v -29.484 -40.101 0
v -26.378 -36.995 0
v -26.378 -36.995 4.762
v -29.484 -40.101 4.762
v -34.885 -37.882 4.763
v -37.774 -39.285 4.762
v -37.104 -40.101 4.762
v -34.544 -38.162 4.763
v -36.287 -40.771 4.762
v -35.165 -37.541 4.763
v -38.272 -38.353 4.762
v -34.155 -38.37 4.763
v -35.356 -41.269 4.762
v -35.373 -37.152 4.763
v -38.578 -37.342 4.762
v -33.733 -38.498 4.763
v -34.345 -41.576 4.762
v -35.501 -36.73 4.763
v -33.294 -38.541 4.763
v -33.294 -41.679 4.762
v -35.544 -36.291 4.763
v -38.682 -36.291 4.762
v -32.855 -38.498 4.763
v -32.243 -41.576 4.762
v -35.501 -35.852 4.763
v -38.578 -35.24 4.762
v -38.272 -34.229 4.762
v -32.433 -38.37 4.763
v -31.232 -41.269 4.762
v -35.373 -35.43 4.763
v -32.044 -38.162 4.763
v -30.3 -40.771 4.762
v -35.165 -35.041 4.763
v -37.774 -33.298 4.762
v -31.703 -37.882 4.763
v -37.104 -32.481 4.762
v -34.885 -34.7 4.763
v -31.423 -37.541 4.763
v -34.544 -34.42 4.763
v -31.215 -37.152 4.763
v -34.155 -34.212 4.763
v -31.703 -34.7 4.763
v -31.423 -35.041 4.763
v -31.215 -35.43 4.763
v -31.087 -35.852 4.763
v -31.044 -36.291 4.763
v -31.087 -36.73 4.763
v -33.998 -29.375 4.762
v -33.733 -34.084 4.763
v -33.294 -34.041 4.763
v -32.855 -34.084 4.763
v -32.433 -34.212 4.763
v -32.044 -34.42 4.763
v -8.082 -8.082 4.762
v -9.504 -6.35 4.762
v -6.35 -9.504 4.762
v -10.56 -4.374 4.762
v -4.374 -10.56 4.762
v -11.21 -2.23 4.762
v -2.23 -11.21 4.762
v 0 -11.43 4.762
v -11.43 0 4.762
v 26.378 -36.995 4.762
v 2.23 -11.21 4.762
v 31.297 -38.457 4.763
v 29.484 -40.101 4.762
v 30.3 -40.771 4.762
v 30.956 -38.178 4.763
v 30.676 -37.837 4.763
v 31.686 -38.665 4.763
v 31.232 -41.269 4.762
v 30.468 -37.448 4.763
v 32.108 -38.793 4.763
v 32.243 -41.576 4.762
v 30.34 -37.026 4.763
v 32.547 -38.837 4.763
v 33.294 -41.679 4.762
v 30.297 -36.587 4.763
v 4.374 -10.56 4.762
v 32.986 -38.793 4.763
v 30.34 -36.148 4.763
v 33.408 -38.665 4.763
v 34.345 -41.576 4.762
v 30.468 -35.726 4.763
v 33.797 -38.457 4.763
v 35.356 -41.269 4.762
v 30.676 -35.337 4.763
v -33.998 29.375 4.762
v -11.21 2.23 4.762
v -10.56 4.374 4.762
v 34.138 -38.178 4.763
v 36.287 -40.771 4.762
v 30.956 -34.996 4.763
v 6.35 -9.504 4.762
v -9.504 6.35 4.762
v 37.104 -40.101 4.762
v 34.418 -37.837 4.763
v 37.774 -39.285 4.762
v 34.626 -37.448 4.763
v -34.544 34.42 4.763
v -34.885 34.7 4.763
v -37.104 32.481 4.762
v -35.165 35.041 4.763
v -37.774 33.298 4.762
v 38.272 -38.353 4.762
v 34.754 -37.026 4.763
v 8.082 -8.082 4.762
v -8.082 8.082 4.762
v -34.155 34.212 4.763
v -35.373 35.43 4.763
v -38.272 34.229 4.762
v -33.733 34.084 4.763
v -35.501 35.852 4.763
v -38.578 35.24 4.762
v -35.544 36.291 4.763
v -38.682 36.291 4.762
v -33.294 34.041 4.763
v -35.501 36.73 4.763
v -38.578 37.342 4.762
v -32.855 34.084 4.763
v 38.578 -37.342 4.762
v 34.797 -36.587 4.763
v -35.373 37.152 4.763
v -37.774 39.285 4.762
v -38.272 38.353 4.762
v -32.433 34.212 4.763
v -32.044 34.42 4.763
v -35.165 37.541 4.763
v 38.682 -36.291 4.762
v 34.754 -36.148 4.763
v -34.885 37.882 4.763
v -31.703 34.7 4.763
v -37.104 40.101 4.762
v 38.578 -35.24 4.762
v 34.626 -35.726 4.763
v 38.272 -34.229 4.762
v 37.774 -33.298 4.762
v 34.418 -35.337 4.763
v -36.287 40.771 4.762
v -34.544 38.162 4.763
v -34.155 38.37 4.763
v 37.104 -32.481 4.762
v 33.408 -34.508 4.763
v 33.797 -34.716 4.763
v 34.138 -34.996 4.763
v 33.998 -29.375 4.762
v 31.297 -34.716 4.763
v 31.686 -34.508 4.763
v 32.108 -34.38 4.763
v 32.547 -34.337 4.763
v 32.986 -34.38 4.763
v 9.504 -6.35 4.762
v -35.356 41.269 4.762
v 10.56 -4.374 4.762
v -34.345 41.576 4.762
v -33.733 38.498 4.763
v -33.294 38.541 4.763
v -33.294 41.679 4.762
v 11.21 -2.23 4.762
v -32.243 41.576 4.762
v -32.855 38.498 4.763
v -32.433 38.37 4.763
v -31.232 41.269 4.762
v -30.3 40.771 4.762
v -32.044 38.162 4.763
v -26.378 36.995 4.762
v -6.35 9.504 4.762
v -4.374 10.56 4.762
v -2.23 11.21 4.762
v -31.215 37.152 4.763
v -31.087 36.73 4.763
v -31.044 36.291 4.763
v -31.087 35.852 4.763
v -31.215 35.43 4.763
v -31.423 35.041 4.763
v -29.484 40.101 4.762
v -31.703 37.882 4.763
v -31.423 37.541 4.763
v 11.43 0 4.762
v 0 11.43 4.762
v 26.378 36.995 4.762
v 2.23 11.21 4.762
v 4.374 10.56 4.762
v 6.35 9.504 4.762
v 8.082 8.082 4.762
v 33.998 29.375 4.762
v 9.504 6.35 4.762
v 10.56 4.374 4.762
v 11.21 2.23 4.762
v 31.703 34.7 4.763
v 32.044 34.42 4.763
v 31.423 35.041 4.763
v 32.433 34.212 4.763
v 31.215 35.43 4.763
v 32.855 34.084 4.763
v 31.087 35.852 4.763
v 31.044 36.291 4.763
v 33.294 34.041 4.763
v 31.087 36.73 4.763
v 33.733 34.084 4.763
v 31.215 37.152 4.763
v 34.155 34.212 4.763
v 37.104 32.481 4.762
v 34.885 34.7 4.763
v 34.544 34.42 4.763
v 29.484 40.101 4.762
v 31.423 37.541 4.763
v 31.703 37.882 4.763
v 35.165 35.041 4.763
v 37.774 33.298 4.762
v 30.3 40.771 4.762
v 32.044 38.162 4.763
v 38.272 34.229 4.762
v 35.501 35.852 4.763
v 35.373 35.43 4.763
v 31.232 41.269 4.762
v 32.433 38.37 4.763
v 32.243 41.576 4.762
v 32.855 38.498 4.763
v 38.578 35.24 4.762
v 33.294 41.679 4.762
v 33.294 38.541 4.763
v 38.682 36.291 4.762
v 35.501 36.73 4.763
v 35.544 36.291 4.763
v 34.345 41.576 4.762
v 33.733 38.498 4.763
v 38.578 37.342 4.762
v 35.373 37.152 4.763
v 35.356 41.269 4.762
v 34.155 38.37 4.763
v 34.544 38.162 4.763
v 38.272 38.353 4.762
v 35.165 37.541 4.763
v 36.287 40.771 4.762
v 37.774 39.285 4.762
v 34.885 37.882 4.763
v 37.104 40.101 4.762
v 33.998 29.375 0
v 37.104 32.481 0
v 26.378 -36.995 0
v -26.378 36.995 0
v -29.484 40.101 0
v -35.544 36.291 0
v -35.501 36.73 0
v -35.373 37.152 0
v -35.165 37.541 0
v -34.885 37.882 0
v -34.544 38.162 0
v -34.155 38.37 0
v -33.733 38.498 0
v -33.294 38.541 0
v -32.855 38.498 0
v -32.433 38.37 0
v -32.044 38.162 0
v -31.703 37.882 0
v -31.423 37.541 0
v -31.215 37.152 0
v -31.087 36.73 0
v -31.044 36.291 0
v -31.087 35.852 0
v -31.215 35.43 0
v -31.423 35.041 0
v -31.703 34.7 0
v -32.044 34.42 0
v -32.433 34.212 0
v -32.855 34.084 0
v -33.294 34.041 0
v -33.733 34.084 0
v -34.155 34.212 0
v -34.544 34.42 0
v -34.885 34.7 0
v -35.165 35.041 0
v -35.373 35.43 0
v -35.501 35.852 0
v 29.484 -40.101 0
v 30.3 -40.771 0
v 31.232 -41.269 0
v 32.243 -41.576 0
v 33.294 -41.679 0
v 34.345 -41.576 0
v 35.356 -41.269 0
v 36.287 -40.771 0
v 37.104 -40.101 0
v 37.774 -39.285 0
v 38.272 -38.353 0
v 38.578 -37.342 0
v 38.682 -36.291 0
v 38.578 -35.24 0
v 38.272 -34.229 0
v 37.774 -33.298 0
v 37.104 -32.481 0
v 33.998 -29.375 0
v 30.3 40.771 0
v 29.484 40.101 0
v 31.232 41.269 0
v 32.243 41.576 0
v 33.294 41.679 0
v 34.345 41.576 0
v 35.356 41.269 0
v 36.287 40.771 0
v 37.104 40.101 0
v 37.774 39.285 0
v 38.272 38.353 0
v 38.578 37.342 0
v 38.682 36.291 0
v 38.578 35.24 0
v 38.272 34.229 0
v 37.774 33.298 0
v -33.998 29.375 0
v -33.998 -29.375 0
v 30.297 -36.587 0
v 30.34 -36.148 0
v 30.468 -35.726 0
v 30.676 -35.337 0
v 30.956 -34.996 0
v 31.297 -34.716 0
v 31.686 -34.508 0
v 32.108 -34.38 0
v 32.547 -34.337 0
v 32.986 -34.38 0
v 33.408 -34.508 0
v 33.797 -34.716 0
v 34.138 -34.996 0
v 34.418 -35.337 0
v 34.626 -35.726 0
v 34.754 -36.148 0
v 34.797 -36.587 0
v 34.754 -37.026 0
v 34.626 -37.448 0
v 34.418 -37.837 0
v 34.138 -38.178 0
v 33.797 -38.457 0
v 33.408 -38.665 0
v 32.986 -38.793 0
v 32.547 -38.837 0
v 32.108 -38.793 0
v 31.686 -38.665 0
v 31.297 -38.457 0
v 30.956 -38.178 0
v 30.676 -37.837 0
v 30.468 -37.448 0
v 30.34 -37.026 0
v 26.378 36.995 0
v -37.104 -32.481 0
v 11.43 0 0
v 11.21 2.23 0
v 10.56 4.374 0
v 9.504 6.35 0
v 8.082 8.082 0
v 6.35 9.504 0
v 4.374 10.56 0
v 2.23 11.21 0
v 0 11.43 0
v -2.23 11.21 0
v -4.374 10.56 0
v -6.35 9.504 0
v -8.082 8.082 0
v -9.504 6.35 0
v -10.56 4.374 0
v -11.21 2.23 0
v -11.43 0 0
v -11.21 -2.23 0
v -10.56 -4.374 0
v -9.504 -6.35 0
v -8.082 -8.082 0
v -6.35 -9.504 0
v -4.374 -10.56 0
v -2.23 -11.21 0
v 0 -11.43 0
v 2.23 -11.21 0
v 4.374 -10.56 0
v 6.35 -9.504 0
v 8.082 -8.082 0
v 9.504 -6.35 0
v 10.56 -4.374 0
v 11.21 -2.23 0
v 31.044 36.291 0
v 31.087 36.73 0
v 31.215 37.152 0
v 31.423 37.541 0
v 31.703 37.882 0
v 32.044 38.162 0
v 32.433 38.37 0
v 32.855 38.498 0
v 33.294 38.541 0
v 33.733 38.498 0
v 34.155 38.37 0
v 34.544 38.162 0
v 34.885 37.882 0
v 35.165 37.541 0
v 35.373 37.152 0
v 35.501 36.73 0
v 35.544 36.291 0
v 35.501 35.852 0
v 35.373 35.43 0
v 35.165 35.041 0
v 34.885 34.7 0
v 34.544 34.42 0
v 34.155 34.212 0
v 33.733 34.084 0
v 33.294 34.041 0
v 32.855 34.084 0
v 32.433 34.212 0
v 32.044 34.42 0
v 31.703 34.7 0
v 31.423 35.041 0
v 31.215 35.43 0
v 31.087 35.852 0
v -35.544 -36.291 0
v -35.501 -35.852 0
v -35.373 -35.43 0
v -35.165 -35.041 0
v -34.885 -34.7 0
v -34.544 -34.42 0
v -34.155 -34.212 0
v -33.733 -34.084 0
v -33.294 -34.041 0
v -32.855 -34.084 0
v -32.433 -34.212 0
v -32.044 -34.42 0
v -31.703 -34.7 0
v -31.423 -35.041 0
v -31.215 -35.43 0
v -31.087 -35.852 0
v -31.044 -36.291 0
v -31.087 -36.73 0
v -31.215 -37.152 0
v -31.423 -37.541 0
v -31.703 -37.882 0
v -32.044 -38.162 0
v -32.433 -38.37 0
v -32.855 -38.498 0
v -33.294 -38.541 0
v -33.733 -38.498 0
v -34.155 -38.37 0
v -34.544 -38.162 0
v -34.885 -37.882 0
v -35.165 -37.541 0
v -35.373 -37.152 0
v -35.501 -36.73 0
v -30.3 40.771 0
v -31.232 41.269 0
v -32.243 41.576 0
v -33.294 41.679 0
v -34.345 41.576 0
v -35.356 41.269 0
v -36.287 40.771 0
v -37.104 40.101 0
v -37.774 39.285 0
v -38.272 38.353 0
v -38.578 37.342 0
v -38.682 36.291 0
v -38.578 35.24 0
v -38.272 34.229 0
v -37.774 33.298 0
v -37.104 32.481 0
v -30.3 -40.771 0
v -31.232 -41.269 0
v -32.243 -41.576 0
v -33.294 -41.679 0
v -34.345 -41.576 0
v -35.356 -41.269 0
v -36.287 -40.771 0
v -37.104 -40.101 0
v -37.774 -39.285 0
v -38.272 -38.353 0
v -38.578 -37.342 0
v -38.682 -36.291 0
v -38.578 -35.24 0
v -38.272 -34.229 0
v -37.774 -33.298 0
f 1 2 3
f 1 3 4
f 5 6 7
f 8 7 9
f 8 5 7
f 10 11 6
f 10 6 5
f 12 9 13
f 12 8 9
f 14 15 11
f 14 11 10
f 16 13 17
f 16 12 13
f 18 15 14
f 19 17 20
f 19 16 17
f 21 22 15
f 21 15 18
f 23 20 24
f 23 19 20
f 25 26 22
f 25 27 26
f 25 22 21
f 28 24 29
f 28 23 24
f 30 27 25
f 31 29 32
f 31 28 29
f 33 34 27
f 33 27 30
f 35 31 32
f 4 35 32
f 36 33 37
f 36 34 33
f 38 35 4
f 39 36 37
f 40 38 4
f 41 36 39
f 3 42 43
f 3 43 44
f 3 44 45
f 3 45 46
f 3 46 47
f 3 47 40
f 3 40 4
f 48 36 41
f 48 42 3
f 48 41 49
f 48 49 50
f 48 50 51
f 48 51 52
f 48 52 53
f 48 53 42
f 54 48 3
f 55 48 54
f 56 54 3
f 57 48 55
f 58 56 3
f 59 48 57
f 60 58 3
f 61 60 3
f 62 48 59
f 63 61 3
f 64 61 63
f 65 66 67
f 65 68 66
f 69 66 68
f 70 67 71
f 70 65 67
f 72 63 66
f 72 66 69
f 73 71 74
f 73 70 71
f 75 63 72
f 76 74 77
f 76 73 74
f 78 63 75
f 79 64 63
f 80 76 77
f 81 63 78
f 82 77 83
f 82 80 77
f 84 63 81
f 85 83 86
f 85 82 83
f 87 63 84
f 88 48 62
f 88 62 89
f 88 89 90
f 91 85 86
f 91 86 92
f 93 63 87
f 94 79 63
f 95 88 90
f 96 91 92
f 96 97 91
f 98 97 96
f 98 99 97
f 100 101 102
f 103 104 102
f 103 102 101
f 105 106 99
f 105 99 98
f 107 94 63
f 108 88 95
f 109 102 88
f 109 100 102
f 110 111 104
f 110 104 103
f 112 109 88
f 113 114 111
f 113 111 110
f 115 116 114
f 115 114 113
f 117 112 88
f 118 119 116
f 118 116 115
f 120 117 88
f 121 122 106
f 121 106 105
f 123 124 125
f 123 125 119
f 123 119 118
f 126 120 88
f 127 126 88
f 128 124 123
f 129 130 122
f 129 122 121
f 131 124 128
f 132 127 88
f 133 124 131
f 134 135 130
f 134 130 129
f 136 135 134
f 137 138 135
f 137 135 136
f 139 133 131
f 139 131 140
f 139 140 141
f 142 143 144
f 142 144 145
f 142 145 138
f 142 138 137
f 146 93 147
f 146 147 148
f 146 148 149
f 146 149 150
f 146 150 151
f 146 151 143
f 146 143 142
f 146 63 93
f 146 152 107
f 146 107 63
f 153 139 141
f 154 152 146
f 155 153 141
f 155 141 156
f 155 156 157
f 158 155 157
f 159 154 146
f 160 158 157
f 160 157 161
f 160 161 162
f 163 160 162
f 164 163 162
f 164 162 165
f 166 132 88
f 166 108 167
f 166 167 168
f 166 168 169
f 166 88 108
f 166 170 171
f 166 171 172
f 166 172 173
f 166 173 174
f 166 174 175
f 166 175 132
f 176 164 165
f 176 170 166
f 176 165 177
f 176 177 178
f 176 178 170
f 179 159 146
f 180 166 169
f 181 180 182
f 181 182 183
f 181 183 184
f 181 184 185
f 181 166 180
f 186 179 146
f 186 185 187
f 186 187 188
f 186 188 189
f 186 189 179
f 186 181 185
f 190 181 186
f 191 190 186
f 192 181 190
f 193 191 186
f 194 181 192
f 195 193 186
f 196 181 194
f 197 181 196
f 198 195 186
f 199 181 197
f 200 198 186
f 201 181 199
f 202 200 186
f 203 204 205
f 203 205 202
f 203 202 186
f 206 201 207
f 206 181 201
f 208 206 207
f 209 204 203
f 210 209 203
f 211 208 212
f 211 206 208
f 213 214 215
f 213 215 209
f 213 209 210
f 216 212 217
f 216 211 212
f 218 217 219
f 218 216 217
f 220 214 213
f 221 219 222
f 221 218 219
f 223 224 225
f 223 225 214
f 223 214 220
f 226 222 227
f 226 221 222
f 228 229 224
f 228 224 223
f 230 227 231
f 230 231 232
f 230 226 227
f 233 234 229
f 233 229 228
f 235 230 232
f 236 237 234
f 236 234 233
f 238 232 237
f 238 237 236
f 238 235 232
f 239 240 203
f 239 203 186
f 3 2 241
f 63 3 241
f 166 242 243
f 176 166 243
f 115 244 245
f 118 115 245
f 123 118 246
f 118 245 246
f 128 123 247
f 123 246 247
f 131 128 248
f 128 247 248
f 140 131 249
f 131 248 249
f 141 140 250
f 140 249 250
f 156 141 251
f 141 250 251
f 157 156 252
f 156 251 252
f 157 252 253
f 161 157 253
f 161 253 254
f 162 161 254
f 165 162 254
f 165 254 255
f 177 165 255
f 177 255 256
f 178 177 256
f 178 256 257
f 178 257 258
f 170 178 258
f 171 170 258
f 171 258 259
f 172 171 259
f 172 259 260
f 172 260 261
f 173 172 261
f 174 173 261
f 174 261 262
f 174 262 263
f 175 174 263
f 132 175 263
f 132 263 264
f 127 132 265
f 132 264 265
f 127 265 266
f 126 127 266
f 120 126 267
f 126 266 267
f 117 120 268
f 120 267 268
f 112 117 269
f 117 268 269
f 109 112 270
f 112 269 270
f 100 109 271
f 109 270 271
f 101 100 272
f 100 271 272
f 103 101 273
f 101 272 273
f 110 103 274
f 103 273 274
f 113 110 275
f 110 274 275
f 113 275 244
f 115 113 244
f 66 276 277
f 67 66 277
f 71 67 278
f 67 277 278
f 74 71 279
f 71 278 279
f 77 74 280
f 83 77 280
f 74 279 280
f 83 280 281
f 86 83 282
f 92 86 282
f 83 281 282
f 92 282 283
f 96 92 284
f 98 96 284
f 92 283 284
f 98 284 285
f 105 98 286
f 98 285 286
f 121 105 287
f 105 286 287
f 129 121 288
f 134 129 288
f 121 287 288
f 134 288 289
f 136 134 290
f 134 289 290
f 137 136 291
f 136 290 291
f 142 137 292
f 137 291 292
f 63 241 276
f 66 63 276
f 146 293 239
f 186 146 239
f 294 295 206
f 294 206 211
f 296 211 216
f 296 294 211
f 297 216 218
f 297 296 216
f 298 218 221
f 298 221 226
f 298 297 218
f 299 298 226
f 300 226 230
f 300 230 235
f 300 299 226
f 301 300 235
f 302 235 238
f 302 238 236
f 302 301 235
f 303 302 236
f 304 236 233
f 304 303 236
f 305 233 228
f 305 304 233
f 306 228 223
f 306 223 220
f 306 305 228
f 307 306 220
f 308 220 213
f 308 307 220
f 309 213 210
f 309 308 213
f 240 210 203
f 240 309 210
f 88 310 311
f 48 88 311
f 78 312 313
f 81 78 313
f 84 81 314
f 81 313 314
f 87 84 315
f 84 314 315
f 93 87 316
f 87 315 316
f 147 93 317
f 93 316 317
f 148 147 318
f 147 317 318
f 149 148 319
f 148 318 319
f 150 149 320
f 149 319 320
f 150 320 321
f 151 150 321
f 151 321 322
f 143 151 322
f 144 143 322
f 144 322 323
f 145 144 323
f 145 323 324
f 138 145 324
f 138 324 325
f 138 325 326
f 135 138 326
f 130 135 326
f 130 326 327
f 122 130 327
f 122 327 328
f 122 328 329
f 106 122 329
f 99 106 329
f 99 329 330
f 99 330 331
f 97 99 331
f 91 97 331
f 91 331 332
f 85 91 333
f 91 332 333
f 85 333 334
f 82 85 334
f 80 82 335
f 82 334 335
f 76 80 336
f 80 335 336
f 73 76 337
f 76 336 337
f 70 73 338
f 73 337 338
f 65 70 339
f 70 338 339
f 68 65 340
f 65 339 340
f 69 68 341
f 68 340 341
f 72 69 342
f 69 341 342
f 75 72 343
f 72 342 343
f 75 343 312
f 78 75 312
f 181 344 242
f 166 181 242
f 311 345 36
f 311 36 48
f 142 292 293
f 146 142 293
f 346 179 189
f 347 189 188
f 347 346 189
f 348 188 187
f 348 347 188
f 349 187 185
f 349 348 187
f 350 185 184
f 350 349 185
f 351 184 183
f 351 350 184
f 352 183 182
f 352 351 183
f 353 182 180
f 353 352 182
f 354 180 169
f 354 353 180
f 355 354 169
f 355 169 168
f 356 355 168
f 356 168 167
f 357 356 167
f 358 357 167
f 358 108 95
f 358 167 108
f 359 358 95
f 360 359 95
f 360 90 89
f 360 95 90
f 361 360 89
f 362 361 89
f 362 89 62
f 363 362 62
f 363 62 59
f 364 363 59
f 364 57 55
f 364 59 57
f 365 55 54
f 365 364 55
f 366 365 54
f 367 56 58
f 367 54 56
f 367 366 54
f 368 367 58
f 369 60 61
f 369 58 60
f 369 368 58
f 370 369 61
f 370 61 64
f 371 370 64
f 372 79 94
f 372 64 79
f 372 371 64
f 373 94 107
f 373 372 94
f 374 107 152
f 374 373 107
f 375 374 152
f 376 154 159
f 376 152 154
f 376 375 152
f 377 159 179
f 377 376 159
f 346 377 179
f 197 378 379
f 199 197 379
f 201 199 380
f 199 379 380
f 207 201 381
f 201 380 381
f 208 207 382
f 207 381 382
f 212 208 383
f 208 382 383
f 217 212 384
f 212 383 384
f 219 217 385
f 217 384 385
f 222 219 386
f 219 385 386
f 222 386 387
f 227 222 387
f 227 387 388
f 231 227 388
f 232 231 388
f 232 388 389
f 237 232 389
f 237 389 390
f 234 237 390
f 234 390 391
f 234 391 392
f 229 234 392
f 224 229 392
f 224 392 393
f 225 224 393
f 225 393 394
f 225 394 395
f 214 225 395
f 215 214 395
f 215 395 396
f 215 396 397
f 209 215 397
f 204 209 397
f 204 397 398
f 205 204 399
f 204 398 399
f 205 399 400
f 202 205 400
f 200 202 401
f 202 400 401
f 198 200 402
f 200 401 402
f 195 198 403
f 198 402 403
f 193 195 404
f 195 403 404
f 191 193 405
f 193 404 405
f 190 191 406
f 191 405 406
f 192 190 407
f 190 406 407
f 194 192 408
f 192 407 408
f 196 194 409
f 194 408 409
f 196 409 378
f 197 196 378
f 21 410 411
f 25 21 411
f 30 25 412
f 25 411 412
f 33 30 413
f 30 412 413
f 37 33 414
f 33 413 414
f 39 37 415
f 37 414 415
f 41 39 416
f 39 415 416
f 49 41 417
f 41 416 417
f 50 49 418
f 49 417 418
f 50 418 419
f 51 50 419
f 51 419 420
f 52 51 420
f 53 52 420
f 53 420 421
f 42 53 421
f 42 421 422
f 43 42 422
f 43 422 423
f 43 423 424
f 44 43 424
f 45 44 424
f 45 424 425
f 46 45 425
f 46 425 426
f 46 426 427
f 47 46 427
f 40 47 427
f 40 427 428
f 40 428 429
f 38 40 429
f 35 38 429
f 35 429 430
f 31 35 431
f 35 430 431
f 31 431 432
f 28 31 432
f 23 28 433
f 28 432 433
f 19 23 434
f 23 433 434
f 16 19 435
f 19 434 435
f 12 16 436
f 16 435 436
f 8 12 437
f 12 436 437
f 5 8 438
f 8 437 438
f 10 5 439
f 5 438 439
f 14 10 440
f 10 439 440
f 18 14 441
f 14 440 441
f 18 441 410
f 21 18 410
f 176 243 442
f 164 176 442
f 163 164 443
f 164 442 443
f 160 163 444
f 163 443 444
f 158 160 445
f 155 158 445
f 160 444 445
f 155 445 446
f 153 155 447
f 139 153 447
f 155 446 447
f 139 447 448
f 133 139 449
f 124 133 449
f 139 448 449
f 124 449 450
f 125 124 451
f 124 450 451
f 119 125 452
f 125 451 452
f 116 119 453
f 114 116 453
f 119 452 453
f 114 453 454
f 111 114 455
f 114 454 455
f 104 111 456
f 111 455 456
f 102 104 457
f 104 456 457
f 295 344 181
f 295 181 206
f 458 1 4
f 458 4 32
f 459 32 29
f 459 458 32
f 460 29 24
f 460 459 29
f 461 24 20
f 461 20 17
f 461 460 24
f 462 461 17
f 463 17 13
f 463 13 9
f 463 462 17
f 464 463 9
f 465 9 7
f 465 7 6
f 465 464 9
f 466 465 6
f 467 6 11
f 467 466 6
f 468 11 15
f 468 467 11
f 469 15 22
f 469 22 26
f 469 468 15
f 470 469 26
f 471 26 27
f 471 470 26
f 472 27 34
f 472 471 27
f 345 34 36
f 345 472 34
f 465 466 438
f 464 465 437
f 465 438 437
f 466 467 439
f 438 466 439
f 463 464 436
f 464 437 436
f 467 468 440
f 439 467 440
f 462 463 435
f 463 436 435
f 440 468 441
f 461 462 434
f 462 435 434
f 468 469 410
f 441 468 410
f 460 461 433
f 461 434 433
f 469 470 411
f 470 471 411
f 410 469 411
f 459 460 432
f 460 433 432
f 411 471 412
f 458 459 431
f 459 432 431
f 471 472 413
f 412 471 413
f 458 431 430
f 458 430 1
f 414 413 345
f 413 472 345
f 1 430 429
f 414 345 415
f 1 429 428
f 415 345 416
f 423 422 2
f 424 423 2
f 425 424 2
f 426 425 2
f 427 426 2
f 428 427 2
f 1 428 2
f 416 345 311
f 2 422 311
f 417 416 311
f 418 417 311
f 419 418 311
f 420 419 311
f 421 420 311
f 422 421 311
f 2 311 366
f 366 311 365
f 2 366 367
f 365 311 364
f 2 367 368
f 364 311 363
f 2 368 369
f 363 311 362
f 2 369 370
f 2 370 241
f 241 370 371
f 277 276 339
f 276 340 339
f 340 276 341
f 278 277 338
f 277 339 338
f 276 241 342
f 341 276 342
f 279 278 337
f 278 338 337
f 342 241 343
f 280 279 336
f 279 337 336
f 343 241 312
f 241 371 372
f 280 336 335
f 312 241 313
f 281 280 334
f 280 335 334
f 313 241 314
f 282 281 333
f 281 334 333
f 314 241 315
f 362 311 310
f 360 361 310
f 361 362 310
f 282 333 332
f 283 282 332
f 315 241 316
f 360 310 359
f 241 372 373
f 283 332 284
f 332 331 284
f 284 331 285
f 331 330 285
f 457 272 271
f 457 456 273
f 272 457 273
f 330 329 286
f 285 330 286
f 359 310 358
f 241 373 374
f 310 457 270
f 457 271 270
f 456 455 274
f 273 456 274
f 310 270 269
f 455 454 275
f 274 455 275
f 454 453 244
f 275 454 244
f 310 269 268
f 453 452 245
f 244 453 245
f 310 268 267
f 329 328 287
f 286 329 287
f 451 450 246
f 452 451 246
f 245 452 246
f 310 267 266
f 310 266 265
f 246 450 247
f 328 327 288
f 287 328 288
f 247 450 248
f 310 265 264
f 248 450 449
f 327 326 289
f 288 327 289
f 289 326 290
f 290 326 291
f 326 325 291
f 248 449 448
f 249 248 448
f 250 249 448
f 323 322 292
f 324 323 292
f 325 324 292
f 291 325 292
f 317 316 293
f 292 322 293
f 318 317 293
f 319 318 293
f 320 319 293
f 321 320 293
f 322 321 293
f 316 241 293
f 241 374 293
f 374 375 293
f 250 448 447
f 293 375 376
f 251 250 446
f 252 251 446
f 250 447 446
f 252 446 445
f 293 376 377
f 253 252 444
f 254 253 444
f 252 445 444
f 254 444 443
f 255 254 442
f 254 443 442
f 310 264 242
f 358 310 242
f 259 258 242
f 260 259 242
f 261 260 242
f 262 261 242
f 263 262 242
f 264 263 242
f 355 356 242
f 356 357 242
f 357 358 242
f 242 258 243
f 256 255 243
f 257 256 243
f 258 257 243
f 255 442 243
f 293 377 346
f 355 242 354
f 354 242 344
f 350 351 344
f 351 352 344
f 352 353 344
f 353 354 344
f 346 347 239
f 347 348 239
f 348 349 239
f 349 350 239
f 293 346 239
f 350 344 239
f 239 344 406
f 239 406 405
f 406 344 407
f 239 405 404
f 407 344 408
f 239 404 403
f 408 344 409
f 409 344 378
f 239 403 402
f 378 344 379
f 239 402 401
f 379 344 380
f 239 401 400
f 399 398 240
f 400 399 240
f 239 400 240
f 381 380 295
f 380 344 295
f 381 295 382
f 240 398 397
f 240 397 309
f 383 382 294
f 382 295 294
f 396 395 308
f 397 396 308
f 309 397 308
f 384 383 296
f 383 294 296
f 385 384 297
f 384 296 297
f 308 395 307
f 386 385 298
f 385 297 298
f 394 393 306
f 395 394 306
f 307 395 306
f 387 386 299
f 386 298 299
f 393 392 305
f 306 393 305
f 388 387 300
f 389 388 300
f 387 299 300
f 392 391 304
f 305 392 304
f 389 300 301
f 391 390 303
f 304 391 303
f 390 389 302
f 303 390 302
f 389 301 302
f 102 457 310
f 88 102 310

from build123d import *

# Parameters (mm, degrees)
SKETCH1_R               = 11.43
BOSS_EXTRUDE1_DEPTH     = 4.7625
MIRROR2_COPY_1_SKETCH_R = 11.43
MIRROR2_COPY_1_DEPTH    = 4.7625
M4_CLEARANCE_HOLE2_D    = 4.5


with BuildPart() as part:
    # Sketch1 → Boss-Extrude1 (new body)
    with BuildSketch(Plane.XY):
        with BuildLine():
            Line((33.9979, -29.3751), (33.9979, 36.9951))
            Line((33.9979, 36.9951), (-33.9979, 36.9951))
            Line((-33.9979, 36.9951), (-33.9979, -36.9951))
            Line((-33.9979, -36.9951), (26.3779, -36.9951))
            Line((26.3779, -36.9951), (29.48387433, -40.10107433))
            ThreePointArc((29.48387433, -40.10107433), (37.10387433, -40.10107433), (37.10387433, -32.48107433))
            Line((37.10387433, -32.48107433), (33.9979, -29.3751))
        make_face()
        Circle(SKETCH1_R, mode=Mode.SUBTRACT)
        Polygon((33.926365892, -36.9951), (33.9979, -36.923565892), (33.9979, -36.9951), align=None, mode=Mode.SUBTRACT)
    boss_extrude1 = extrude(amount=BOSS_EXTRUDE1_DEPTH)

    # Mirror1: Boss-Extrude1 across plane
    add(boss_extrude1.mirror(Plane.ZX))

    # Mirror2: Boss-Extrude1 across plane
    add(boss_extrude1.mirror(Plane(origin=(0, 0, 0), x_dir=(0, 0, 1), z_dir=(1, 0, 0))))

    # Mirror2 copy 1 sketch → Mirror2 copy 1 (add)
    with BuildSketch(Plane(origin=(0, 0, 0), x_dir=(-1, 0, 0), z_dir=(0, 0, 1))):
        with BuildLine():
            Line((33.9979, -29.3751), (33.9979, 36.9951))
            Line((33.9979, 36.9951), (-33.9979, 36.9951))
            Line((-33.9979, 36.9951), (-33.9979, -36.9951))
            Line((-33.9979, -36.9951), (26.3779, -36.9951))
            Line((26.3779, -36.9951), (29.48387433, -40.10107433))
            ThreePointArc((29.48387433, -40.10107433), (37.10387433, -40.10107433), (37.10387433, -32.48107433))
            Line((37.10387433, -32.48107433), (33.9979, -29.3751))
        make_face()
        Circle(MIRROR2_COPY_1_SKETCH_R, mode=Mode.SUBTRACT)
        Polygon((33.926365892, -36.9951), (33.9979, -36.923565892), (33.9979, -36.9951), align=None, mode=Mode.SUBTRACT)
    extrude(amount=MIRROR2_COPY_1_DEPTH)

    # M4 Clearance Hole2 (through all)
    with Locations(Plane.XY.offset(4.7625)):
        with Locations((-33.29387433, 36.29107433), (33.29387433, 36.29107433), (32.547164682, -36.586652732), (-33.29387433, -36.29107433)):
            Hole(M4_CLEARANCE_HOLE2_D / 2)


solid = part.part
